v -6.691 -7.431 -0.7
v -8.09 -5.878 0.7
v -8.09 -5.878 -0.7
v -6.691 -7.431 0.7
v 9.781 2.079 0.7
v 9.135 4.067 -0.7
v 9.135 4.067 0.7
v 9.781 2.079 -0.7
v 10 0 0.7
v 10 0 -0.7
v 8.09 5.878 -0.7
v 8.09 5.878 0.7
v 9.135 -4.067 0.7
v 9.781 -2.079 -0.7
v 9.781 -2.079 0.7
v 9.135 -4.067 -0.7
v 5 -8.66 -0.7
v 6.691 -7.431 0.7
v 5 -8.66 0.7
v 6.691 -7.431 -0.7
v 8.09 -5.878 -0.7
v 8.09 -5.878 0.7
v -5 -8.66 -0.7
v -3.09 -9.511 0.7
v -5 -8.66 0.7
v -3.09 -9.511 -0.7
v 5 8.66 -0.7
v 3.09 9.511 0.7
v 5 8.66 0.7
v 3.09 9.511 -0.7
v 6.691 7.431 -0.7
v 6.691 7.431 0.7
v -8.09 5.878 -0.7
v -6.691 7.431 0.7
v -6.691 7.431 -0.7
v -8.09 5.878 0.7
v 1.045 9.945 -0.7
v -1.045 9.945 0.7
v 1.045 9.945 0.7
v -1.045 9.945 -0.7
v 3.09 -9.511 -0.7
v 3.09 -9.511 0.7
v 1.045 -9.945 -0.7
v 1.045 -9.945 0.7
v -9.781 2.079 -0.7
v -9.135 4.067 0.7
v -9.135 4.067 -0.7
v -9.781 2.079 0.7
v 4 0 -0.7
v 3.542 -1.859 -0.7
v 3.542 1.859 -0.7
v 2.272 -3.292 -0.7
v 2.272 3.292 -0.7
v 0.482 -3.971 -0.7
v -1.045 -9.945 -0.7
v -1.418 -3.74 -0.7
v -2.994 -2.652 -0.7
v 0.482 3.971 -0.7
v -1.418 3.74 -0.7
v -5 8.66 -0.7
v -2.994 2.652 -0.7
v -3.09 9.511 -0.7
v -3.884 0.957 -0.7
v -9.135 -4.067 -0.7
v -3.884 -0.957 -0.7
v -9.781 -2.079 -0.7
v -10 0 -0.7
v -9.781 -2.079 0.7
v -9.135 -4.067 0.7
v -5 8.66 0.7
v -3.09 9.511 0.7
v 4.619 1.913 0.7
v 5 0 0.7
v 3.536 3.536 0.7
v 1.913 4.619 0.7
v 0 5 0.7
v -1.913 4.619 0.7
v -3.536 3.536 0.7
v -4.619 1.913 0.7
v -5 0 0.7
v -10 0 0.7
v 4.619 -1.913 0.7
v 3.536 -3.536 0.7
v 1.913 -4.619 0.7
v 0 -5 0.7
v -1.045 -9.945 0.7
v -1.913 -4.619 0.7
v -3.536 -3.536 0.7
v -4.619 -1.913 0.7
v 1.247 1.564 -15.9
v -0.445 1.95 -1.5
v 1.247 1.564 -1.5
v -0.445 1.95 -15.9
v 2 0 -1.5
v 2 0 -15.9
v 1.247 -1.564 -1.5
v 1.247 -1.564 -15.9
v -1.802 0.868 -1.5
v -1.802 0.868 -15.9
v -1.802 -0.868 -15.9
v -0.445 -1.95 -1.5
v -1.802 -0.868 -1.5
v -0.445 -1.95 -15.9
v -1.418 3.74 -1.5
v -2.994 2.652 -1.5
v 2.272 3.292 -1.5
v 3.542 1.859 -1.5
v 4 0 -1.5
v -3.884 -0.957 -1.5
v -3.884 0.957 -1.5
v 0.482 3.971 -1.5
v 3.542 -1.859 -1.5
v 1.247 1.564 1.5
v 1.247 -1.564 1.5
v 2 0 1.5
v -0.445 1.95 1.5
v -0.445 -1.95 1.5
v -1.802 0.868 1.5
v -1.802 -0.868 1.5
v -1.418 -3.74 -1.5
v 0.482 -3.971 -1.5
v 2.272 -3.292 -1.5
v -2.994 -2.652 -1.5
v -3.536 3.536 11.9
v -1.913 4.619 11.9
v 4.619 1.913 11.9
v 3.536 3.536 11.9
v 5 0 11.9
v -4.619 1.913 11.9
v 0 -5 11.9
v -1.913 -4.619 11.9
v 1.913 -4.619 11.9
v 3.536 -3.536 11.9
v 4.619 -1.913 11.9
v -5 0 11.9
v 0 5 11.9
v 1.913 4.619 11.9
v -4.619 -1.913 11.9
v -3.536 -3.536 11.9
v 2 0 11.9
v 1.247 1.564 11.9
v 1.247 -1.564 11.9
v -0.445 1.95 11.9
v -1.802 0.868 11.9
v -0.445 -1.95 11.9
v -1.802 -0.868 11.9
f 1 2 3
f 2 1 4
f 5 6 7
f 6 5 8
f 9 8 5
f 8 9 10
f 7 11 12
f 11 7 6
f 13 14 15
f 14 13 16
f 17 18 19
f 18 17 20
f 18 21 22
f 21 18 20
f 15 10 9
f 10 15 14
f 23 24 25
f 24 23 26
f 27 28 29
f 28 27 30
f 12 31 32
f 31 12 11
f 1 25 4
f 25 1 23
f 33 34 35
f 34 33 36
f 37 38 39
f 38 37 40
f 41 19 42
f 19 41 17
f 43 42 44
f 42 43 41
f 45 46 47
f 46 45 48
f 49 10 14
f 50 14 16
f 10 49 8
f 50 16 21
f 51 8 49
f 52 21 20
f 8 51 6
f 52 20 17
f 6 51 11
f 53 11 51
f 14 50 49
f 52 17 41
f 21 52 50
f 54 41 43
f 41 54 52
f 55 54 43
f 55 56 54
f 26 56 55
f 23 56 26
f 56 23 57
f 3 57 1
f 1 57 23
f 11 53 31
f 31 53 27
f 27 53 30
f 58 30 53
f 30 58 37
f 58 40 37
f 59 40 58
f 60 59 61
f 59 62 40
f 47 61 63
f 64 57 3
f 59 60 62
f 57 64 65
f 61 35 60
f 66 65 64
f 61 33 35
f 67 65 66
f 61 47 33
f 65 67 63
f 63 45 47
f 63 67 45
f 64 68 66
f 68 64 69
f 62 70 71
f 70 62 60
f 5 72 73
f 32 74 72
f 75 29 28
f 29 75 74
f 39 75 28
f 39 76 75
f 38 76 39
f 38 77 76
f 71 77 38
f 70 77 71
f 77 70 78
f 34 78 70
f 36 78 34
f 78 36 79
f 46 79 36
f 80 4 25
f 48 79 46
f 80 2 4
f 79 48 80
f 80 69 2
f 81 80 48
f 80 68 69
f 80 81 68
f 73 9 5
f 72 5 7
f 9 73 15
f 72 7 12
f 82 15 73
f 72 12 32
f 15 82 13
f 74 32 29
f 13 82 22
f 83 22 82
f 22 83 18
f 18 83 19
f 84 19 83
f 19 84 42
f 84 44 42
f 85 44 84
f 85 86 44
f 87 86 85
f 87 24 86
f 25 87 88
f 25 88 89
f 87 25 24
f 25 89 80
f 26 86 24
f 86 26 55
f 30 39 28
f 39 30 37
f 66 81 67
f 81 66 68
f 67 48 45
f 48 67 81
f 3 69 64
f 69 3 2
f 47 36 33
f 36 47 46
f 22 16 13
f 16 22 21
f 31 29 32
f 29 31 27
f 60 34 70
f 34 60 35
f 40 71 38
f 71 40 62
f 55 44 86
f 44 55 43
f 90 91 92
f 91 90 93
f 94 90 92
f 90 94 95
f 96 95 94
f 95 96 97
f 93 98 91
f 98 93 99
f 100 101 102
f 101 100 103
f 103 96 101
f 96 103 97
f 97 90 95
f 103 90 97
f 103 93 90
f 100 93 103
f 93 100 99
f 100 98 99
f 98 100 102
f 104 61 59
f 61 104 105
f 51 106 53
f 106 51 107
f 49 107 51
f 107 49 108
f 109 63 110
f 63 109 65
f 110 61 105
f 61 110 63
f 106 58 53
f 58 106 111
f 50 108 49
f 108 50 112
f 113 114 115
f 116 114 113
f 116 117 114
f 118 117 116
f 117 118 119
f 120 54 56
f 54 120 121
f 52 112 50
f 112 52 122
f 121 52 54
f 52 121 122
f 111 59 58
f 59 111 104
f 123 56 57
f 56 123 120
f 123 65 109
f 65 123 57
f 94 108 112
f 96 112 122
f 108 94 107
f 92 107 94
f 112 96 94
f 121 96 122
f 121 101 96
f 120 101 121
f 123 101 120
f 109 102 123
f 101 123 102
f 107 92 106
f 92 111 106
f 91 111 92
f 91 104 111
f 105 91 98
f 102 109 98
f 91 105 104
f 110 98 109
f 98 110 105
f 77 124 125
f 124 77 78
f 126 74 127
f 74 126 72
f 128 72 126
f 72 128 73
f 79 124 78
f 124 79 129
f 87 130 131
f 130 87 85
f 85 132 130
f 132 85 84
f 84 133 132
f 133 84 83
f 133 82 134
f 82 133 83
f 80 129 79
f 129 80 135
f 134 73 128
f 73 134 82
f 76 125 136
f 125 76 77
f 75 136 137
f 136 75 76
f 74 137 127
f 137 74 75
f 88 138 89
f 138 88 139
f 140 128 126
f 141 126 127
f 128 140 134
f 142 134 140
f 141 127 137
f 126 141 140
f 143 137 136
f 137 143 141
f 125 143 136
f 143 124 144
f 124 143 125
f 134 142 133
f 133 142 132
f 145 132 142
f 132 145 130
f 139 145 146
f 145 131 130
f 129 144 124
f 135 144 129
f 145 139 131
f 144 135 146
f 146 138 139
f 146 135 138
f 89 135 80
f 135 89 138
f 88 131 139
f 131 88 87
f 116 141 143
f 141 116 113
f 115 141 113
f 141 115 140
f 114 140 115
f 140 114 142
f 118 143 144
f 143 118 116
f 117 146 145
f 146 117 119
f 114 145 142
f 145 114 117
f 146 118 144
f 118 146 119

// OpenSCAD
// Parameters
inner_diameter_mm = 5; //[2.5:10:0.1]
outer_diameter_mm = 20; //[10:40:0.1]
thickness_mm = 1.4; //[0.7:2.8:0.1]
eps_mm = 0.8; //[0.2:2:0.1]
jack_outer_diameter_mm = 10; //[6:20:0.1]
jack_length_mm = 12; //[6:30:0.1]
jack_hole_diameter_mm = 4; //[3:6:0.1]
screw_shank_diameter_mm = 4; //[2:8:0.1]
screw_length_mm = 16; //[8:40:0.5]
screw_head_diameter_mm = 8; //[4:16:0.1]
screw_head_height_mm = 3; //[1.5:6:0.1]

// Penny Washer - complete geometry
module penny_washer() {
  color("Silver") {
    difference() {
      cylinder(r=outer_diameter_mm/2, h=thickness_mm, center=true);
      translate([0, 0, 0])
        cylinder(r=inner_diameter_mm/2, h=thickness_mm + 2*eps_mm, center=true);
    }
  }
}

// Screw and Washer - complete geometry
module screw_and_washer() {
  color("DimGray") {
    union() {
      // Screw Shank
      translate([0, 0, -thickness_mm/2 - screw_length_mm/2 + eps_mm])
        cylinder(r=screw_shank_diameter_mm/2, h=screw_length_mm, center=true);
      // Screw Head
      translate([0, 0, -thickness_mm/2 + screw_head_height_mm/2 - eps_mm])
        cylinder(r=screw_head_diameter_mm/2, h=screw_head_height_mm, center=true);
    }
  }
}

// Jack 4mm Plastic - complete geometry
module jack_4mm_plastic() {
  color([0.15, 0.2, 0.35]) {
    difference() {
      translate([0, 0, thickness_mm/2 + jack_length_mm/2 - eps_mm])
        cylinder(r=jack_outer_diameter_mm/2, h=jack_length_mm, center=true);
      translate([0, 0, thickness_mm/2 + jack_length_mm/2 - eps_mm])
        cylinder(r=jack_hole_diameter_mm/2, h=jack_length_mm + 2*eps_mm, center=true);
    }
  }
}

// Jack 4mm - complete geometry
module jack_4mm() {
  jack_4mm_plastic();
}

// Assembly
module assembly() {
  penny_washer();
  screw_and_washer();
  jack_4mm();
}

assembly();
